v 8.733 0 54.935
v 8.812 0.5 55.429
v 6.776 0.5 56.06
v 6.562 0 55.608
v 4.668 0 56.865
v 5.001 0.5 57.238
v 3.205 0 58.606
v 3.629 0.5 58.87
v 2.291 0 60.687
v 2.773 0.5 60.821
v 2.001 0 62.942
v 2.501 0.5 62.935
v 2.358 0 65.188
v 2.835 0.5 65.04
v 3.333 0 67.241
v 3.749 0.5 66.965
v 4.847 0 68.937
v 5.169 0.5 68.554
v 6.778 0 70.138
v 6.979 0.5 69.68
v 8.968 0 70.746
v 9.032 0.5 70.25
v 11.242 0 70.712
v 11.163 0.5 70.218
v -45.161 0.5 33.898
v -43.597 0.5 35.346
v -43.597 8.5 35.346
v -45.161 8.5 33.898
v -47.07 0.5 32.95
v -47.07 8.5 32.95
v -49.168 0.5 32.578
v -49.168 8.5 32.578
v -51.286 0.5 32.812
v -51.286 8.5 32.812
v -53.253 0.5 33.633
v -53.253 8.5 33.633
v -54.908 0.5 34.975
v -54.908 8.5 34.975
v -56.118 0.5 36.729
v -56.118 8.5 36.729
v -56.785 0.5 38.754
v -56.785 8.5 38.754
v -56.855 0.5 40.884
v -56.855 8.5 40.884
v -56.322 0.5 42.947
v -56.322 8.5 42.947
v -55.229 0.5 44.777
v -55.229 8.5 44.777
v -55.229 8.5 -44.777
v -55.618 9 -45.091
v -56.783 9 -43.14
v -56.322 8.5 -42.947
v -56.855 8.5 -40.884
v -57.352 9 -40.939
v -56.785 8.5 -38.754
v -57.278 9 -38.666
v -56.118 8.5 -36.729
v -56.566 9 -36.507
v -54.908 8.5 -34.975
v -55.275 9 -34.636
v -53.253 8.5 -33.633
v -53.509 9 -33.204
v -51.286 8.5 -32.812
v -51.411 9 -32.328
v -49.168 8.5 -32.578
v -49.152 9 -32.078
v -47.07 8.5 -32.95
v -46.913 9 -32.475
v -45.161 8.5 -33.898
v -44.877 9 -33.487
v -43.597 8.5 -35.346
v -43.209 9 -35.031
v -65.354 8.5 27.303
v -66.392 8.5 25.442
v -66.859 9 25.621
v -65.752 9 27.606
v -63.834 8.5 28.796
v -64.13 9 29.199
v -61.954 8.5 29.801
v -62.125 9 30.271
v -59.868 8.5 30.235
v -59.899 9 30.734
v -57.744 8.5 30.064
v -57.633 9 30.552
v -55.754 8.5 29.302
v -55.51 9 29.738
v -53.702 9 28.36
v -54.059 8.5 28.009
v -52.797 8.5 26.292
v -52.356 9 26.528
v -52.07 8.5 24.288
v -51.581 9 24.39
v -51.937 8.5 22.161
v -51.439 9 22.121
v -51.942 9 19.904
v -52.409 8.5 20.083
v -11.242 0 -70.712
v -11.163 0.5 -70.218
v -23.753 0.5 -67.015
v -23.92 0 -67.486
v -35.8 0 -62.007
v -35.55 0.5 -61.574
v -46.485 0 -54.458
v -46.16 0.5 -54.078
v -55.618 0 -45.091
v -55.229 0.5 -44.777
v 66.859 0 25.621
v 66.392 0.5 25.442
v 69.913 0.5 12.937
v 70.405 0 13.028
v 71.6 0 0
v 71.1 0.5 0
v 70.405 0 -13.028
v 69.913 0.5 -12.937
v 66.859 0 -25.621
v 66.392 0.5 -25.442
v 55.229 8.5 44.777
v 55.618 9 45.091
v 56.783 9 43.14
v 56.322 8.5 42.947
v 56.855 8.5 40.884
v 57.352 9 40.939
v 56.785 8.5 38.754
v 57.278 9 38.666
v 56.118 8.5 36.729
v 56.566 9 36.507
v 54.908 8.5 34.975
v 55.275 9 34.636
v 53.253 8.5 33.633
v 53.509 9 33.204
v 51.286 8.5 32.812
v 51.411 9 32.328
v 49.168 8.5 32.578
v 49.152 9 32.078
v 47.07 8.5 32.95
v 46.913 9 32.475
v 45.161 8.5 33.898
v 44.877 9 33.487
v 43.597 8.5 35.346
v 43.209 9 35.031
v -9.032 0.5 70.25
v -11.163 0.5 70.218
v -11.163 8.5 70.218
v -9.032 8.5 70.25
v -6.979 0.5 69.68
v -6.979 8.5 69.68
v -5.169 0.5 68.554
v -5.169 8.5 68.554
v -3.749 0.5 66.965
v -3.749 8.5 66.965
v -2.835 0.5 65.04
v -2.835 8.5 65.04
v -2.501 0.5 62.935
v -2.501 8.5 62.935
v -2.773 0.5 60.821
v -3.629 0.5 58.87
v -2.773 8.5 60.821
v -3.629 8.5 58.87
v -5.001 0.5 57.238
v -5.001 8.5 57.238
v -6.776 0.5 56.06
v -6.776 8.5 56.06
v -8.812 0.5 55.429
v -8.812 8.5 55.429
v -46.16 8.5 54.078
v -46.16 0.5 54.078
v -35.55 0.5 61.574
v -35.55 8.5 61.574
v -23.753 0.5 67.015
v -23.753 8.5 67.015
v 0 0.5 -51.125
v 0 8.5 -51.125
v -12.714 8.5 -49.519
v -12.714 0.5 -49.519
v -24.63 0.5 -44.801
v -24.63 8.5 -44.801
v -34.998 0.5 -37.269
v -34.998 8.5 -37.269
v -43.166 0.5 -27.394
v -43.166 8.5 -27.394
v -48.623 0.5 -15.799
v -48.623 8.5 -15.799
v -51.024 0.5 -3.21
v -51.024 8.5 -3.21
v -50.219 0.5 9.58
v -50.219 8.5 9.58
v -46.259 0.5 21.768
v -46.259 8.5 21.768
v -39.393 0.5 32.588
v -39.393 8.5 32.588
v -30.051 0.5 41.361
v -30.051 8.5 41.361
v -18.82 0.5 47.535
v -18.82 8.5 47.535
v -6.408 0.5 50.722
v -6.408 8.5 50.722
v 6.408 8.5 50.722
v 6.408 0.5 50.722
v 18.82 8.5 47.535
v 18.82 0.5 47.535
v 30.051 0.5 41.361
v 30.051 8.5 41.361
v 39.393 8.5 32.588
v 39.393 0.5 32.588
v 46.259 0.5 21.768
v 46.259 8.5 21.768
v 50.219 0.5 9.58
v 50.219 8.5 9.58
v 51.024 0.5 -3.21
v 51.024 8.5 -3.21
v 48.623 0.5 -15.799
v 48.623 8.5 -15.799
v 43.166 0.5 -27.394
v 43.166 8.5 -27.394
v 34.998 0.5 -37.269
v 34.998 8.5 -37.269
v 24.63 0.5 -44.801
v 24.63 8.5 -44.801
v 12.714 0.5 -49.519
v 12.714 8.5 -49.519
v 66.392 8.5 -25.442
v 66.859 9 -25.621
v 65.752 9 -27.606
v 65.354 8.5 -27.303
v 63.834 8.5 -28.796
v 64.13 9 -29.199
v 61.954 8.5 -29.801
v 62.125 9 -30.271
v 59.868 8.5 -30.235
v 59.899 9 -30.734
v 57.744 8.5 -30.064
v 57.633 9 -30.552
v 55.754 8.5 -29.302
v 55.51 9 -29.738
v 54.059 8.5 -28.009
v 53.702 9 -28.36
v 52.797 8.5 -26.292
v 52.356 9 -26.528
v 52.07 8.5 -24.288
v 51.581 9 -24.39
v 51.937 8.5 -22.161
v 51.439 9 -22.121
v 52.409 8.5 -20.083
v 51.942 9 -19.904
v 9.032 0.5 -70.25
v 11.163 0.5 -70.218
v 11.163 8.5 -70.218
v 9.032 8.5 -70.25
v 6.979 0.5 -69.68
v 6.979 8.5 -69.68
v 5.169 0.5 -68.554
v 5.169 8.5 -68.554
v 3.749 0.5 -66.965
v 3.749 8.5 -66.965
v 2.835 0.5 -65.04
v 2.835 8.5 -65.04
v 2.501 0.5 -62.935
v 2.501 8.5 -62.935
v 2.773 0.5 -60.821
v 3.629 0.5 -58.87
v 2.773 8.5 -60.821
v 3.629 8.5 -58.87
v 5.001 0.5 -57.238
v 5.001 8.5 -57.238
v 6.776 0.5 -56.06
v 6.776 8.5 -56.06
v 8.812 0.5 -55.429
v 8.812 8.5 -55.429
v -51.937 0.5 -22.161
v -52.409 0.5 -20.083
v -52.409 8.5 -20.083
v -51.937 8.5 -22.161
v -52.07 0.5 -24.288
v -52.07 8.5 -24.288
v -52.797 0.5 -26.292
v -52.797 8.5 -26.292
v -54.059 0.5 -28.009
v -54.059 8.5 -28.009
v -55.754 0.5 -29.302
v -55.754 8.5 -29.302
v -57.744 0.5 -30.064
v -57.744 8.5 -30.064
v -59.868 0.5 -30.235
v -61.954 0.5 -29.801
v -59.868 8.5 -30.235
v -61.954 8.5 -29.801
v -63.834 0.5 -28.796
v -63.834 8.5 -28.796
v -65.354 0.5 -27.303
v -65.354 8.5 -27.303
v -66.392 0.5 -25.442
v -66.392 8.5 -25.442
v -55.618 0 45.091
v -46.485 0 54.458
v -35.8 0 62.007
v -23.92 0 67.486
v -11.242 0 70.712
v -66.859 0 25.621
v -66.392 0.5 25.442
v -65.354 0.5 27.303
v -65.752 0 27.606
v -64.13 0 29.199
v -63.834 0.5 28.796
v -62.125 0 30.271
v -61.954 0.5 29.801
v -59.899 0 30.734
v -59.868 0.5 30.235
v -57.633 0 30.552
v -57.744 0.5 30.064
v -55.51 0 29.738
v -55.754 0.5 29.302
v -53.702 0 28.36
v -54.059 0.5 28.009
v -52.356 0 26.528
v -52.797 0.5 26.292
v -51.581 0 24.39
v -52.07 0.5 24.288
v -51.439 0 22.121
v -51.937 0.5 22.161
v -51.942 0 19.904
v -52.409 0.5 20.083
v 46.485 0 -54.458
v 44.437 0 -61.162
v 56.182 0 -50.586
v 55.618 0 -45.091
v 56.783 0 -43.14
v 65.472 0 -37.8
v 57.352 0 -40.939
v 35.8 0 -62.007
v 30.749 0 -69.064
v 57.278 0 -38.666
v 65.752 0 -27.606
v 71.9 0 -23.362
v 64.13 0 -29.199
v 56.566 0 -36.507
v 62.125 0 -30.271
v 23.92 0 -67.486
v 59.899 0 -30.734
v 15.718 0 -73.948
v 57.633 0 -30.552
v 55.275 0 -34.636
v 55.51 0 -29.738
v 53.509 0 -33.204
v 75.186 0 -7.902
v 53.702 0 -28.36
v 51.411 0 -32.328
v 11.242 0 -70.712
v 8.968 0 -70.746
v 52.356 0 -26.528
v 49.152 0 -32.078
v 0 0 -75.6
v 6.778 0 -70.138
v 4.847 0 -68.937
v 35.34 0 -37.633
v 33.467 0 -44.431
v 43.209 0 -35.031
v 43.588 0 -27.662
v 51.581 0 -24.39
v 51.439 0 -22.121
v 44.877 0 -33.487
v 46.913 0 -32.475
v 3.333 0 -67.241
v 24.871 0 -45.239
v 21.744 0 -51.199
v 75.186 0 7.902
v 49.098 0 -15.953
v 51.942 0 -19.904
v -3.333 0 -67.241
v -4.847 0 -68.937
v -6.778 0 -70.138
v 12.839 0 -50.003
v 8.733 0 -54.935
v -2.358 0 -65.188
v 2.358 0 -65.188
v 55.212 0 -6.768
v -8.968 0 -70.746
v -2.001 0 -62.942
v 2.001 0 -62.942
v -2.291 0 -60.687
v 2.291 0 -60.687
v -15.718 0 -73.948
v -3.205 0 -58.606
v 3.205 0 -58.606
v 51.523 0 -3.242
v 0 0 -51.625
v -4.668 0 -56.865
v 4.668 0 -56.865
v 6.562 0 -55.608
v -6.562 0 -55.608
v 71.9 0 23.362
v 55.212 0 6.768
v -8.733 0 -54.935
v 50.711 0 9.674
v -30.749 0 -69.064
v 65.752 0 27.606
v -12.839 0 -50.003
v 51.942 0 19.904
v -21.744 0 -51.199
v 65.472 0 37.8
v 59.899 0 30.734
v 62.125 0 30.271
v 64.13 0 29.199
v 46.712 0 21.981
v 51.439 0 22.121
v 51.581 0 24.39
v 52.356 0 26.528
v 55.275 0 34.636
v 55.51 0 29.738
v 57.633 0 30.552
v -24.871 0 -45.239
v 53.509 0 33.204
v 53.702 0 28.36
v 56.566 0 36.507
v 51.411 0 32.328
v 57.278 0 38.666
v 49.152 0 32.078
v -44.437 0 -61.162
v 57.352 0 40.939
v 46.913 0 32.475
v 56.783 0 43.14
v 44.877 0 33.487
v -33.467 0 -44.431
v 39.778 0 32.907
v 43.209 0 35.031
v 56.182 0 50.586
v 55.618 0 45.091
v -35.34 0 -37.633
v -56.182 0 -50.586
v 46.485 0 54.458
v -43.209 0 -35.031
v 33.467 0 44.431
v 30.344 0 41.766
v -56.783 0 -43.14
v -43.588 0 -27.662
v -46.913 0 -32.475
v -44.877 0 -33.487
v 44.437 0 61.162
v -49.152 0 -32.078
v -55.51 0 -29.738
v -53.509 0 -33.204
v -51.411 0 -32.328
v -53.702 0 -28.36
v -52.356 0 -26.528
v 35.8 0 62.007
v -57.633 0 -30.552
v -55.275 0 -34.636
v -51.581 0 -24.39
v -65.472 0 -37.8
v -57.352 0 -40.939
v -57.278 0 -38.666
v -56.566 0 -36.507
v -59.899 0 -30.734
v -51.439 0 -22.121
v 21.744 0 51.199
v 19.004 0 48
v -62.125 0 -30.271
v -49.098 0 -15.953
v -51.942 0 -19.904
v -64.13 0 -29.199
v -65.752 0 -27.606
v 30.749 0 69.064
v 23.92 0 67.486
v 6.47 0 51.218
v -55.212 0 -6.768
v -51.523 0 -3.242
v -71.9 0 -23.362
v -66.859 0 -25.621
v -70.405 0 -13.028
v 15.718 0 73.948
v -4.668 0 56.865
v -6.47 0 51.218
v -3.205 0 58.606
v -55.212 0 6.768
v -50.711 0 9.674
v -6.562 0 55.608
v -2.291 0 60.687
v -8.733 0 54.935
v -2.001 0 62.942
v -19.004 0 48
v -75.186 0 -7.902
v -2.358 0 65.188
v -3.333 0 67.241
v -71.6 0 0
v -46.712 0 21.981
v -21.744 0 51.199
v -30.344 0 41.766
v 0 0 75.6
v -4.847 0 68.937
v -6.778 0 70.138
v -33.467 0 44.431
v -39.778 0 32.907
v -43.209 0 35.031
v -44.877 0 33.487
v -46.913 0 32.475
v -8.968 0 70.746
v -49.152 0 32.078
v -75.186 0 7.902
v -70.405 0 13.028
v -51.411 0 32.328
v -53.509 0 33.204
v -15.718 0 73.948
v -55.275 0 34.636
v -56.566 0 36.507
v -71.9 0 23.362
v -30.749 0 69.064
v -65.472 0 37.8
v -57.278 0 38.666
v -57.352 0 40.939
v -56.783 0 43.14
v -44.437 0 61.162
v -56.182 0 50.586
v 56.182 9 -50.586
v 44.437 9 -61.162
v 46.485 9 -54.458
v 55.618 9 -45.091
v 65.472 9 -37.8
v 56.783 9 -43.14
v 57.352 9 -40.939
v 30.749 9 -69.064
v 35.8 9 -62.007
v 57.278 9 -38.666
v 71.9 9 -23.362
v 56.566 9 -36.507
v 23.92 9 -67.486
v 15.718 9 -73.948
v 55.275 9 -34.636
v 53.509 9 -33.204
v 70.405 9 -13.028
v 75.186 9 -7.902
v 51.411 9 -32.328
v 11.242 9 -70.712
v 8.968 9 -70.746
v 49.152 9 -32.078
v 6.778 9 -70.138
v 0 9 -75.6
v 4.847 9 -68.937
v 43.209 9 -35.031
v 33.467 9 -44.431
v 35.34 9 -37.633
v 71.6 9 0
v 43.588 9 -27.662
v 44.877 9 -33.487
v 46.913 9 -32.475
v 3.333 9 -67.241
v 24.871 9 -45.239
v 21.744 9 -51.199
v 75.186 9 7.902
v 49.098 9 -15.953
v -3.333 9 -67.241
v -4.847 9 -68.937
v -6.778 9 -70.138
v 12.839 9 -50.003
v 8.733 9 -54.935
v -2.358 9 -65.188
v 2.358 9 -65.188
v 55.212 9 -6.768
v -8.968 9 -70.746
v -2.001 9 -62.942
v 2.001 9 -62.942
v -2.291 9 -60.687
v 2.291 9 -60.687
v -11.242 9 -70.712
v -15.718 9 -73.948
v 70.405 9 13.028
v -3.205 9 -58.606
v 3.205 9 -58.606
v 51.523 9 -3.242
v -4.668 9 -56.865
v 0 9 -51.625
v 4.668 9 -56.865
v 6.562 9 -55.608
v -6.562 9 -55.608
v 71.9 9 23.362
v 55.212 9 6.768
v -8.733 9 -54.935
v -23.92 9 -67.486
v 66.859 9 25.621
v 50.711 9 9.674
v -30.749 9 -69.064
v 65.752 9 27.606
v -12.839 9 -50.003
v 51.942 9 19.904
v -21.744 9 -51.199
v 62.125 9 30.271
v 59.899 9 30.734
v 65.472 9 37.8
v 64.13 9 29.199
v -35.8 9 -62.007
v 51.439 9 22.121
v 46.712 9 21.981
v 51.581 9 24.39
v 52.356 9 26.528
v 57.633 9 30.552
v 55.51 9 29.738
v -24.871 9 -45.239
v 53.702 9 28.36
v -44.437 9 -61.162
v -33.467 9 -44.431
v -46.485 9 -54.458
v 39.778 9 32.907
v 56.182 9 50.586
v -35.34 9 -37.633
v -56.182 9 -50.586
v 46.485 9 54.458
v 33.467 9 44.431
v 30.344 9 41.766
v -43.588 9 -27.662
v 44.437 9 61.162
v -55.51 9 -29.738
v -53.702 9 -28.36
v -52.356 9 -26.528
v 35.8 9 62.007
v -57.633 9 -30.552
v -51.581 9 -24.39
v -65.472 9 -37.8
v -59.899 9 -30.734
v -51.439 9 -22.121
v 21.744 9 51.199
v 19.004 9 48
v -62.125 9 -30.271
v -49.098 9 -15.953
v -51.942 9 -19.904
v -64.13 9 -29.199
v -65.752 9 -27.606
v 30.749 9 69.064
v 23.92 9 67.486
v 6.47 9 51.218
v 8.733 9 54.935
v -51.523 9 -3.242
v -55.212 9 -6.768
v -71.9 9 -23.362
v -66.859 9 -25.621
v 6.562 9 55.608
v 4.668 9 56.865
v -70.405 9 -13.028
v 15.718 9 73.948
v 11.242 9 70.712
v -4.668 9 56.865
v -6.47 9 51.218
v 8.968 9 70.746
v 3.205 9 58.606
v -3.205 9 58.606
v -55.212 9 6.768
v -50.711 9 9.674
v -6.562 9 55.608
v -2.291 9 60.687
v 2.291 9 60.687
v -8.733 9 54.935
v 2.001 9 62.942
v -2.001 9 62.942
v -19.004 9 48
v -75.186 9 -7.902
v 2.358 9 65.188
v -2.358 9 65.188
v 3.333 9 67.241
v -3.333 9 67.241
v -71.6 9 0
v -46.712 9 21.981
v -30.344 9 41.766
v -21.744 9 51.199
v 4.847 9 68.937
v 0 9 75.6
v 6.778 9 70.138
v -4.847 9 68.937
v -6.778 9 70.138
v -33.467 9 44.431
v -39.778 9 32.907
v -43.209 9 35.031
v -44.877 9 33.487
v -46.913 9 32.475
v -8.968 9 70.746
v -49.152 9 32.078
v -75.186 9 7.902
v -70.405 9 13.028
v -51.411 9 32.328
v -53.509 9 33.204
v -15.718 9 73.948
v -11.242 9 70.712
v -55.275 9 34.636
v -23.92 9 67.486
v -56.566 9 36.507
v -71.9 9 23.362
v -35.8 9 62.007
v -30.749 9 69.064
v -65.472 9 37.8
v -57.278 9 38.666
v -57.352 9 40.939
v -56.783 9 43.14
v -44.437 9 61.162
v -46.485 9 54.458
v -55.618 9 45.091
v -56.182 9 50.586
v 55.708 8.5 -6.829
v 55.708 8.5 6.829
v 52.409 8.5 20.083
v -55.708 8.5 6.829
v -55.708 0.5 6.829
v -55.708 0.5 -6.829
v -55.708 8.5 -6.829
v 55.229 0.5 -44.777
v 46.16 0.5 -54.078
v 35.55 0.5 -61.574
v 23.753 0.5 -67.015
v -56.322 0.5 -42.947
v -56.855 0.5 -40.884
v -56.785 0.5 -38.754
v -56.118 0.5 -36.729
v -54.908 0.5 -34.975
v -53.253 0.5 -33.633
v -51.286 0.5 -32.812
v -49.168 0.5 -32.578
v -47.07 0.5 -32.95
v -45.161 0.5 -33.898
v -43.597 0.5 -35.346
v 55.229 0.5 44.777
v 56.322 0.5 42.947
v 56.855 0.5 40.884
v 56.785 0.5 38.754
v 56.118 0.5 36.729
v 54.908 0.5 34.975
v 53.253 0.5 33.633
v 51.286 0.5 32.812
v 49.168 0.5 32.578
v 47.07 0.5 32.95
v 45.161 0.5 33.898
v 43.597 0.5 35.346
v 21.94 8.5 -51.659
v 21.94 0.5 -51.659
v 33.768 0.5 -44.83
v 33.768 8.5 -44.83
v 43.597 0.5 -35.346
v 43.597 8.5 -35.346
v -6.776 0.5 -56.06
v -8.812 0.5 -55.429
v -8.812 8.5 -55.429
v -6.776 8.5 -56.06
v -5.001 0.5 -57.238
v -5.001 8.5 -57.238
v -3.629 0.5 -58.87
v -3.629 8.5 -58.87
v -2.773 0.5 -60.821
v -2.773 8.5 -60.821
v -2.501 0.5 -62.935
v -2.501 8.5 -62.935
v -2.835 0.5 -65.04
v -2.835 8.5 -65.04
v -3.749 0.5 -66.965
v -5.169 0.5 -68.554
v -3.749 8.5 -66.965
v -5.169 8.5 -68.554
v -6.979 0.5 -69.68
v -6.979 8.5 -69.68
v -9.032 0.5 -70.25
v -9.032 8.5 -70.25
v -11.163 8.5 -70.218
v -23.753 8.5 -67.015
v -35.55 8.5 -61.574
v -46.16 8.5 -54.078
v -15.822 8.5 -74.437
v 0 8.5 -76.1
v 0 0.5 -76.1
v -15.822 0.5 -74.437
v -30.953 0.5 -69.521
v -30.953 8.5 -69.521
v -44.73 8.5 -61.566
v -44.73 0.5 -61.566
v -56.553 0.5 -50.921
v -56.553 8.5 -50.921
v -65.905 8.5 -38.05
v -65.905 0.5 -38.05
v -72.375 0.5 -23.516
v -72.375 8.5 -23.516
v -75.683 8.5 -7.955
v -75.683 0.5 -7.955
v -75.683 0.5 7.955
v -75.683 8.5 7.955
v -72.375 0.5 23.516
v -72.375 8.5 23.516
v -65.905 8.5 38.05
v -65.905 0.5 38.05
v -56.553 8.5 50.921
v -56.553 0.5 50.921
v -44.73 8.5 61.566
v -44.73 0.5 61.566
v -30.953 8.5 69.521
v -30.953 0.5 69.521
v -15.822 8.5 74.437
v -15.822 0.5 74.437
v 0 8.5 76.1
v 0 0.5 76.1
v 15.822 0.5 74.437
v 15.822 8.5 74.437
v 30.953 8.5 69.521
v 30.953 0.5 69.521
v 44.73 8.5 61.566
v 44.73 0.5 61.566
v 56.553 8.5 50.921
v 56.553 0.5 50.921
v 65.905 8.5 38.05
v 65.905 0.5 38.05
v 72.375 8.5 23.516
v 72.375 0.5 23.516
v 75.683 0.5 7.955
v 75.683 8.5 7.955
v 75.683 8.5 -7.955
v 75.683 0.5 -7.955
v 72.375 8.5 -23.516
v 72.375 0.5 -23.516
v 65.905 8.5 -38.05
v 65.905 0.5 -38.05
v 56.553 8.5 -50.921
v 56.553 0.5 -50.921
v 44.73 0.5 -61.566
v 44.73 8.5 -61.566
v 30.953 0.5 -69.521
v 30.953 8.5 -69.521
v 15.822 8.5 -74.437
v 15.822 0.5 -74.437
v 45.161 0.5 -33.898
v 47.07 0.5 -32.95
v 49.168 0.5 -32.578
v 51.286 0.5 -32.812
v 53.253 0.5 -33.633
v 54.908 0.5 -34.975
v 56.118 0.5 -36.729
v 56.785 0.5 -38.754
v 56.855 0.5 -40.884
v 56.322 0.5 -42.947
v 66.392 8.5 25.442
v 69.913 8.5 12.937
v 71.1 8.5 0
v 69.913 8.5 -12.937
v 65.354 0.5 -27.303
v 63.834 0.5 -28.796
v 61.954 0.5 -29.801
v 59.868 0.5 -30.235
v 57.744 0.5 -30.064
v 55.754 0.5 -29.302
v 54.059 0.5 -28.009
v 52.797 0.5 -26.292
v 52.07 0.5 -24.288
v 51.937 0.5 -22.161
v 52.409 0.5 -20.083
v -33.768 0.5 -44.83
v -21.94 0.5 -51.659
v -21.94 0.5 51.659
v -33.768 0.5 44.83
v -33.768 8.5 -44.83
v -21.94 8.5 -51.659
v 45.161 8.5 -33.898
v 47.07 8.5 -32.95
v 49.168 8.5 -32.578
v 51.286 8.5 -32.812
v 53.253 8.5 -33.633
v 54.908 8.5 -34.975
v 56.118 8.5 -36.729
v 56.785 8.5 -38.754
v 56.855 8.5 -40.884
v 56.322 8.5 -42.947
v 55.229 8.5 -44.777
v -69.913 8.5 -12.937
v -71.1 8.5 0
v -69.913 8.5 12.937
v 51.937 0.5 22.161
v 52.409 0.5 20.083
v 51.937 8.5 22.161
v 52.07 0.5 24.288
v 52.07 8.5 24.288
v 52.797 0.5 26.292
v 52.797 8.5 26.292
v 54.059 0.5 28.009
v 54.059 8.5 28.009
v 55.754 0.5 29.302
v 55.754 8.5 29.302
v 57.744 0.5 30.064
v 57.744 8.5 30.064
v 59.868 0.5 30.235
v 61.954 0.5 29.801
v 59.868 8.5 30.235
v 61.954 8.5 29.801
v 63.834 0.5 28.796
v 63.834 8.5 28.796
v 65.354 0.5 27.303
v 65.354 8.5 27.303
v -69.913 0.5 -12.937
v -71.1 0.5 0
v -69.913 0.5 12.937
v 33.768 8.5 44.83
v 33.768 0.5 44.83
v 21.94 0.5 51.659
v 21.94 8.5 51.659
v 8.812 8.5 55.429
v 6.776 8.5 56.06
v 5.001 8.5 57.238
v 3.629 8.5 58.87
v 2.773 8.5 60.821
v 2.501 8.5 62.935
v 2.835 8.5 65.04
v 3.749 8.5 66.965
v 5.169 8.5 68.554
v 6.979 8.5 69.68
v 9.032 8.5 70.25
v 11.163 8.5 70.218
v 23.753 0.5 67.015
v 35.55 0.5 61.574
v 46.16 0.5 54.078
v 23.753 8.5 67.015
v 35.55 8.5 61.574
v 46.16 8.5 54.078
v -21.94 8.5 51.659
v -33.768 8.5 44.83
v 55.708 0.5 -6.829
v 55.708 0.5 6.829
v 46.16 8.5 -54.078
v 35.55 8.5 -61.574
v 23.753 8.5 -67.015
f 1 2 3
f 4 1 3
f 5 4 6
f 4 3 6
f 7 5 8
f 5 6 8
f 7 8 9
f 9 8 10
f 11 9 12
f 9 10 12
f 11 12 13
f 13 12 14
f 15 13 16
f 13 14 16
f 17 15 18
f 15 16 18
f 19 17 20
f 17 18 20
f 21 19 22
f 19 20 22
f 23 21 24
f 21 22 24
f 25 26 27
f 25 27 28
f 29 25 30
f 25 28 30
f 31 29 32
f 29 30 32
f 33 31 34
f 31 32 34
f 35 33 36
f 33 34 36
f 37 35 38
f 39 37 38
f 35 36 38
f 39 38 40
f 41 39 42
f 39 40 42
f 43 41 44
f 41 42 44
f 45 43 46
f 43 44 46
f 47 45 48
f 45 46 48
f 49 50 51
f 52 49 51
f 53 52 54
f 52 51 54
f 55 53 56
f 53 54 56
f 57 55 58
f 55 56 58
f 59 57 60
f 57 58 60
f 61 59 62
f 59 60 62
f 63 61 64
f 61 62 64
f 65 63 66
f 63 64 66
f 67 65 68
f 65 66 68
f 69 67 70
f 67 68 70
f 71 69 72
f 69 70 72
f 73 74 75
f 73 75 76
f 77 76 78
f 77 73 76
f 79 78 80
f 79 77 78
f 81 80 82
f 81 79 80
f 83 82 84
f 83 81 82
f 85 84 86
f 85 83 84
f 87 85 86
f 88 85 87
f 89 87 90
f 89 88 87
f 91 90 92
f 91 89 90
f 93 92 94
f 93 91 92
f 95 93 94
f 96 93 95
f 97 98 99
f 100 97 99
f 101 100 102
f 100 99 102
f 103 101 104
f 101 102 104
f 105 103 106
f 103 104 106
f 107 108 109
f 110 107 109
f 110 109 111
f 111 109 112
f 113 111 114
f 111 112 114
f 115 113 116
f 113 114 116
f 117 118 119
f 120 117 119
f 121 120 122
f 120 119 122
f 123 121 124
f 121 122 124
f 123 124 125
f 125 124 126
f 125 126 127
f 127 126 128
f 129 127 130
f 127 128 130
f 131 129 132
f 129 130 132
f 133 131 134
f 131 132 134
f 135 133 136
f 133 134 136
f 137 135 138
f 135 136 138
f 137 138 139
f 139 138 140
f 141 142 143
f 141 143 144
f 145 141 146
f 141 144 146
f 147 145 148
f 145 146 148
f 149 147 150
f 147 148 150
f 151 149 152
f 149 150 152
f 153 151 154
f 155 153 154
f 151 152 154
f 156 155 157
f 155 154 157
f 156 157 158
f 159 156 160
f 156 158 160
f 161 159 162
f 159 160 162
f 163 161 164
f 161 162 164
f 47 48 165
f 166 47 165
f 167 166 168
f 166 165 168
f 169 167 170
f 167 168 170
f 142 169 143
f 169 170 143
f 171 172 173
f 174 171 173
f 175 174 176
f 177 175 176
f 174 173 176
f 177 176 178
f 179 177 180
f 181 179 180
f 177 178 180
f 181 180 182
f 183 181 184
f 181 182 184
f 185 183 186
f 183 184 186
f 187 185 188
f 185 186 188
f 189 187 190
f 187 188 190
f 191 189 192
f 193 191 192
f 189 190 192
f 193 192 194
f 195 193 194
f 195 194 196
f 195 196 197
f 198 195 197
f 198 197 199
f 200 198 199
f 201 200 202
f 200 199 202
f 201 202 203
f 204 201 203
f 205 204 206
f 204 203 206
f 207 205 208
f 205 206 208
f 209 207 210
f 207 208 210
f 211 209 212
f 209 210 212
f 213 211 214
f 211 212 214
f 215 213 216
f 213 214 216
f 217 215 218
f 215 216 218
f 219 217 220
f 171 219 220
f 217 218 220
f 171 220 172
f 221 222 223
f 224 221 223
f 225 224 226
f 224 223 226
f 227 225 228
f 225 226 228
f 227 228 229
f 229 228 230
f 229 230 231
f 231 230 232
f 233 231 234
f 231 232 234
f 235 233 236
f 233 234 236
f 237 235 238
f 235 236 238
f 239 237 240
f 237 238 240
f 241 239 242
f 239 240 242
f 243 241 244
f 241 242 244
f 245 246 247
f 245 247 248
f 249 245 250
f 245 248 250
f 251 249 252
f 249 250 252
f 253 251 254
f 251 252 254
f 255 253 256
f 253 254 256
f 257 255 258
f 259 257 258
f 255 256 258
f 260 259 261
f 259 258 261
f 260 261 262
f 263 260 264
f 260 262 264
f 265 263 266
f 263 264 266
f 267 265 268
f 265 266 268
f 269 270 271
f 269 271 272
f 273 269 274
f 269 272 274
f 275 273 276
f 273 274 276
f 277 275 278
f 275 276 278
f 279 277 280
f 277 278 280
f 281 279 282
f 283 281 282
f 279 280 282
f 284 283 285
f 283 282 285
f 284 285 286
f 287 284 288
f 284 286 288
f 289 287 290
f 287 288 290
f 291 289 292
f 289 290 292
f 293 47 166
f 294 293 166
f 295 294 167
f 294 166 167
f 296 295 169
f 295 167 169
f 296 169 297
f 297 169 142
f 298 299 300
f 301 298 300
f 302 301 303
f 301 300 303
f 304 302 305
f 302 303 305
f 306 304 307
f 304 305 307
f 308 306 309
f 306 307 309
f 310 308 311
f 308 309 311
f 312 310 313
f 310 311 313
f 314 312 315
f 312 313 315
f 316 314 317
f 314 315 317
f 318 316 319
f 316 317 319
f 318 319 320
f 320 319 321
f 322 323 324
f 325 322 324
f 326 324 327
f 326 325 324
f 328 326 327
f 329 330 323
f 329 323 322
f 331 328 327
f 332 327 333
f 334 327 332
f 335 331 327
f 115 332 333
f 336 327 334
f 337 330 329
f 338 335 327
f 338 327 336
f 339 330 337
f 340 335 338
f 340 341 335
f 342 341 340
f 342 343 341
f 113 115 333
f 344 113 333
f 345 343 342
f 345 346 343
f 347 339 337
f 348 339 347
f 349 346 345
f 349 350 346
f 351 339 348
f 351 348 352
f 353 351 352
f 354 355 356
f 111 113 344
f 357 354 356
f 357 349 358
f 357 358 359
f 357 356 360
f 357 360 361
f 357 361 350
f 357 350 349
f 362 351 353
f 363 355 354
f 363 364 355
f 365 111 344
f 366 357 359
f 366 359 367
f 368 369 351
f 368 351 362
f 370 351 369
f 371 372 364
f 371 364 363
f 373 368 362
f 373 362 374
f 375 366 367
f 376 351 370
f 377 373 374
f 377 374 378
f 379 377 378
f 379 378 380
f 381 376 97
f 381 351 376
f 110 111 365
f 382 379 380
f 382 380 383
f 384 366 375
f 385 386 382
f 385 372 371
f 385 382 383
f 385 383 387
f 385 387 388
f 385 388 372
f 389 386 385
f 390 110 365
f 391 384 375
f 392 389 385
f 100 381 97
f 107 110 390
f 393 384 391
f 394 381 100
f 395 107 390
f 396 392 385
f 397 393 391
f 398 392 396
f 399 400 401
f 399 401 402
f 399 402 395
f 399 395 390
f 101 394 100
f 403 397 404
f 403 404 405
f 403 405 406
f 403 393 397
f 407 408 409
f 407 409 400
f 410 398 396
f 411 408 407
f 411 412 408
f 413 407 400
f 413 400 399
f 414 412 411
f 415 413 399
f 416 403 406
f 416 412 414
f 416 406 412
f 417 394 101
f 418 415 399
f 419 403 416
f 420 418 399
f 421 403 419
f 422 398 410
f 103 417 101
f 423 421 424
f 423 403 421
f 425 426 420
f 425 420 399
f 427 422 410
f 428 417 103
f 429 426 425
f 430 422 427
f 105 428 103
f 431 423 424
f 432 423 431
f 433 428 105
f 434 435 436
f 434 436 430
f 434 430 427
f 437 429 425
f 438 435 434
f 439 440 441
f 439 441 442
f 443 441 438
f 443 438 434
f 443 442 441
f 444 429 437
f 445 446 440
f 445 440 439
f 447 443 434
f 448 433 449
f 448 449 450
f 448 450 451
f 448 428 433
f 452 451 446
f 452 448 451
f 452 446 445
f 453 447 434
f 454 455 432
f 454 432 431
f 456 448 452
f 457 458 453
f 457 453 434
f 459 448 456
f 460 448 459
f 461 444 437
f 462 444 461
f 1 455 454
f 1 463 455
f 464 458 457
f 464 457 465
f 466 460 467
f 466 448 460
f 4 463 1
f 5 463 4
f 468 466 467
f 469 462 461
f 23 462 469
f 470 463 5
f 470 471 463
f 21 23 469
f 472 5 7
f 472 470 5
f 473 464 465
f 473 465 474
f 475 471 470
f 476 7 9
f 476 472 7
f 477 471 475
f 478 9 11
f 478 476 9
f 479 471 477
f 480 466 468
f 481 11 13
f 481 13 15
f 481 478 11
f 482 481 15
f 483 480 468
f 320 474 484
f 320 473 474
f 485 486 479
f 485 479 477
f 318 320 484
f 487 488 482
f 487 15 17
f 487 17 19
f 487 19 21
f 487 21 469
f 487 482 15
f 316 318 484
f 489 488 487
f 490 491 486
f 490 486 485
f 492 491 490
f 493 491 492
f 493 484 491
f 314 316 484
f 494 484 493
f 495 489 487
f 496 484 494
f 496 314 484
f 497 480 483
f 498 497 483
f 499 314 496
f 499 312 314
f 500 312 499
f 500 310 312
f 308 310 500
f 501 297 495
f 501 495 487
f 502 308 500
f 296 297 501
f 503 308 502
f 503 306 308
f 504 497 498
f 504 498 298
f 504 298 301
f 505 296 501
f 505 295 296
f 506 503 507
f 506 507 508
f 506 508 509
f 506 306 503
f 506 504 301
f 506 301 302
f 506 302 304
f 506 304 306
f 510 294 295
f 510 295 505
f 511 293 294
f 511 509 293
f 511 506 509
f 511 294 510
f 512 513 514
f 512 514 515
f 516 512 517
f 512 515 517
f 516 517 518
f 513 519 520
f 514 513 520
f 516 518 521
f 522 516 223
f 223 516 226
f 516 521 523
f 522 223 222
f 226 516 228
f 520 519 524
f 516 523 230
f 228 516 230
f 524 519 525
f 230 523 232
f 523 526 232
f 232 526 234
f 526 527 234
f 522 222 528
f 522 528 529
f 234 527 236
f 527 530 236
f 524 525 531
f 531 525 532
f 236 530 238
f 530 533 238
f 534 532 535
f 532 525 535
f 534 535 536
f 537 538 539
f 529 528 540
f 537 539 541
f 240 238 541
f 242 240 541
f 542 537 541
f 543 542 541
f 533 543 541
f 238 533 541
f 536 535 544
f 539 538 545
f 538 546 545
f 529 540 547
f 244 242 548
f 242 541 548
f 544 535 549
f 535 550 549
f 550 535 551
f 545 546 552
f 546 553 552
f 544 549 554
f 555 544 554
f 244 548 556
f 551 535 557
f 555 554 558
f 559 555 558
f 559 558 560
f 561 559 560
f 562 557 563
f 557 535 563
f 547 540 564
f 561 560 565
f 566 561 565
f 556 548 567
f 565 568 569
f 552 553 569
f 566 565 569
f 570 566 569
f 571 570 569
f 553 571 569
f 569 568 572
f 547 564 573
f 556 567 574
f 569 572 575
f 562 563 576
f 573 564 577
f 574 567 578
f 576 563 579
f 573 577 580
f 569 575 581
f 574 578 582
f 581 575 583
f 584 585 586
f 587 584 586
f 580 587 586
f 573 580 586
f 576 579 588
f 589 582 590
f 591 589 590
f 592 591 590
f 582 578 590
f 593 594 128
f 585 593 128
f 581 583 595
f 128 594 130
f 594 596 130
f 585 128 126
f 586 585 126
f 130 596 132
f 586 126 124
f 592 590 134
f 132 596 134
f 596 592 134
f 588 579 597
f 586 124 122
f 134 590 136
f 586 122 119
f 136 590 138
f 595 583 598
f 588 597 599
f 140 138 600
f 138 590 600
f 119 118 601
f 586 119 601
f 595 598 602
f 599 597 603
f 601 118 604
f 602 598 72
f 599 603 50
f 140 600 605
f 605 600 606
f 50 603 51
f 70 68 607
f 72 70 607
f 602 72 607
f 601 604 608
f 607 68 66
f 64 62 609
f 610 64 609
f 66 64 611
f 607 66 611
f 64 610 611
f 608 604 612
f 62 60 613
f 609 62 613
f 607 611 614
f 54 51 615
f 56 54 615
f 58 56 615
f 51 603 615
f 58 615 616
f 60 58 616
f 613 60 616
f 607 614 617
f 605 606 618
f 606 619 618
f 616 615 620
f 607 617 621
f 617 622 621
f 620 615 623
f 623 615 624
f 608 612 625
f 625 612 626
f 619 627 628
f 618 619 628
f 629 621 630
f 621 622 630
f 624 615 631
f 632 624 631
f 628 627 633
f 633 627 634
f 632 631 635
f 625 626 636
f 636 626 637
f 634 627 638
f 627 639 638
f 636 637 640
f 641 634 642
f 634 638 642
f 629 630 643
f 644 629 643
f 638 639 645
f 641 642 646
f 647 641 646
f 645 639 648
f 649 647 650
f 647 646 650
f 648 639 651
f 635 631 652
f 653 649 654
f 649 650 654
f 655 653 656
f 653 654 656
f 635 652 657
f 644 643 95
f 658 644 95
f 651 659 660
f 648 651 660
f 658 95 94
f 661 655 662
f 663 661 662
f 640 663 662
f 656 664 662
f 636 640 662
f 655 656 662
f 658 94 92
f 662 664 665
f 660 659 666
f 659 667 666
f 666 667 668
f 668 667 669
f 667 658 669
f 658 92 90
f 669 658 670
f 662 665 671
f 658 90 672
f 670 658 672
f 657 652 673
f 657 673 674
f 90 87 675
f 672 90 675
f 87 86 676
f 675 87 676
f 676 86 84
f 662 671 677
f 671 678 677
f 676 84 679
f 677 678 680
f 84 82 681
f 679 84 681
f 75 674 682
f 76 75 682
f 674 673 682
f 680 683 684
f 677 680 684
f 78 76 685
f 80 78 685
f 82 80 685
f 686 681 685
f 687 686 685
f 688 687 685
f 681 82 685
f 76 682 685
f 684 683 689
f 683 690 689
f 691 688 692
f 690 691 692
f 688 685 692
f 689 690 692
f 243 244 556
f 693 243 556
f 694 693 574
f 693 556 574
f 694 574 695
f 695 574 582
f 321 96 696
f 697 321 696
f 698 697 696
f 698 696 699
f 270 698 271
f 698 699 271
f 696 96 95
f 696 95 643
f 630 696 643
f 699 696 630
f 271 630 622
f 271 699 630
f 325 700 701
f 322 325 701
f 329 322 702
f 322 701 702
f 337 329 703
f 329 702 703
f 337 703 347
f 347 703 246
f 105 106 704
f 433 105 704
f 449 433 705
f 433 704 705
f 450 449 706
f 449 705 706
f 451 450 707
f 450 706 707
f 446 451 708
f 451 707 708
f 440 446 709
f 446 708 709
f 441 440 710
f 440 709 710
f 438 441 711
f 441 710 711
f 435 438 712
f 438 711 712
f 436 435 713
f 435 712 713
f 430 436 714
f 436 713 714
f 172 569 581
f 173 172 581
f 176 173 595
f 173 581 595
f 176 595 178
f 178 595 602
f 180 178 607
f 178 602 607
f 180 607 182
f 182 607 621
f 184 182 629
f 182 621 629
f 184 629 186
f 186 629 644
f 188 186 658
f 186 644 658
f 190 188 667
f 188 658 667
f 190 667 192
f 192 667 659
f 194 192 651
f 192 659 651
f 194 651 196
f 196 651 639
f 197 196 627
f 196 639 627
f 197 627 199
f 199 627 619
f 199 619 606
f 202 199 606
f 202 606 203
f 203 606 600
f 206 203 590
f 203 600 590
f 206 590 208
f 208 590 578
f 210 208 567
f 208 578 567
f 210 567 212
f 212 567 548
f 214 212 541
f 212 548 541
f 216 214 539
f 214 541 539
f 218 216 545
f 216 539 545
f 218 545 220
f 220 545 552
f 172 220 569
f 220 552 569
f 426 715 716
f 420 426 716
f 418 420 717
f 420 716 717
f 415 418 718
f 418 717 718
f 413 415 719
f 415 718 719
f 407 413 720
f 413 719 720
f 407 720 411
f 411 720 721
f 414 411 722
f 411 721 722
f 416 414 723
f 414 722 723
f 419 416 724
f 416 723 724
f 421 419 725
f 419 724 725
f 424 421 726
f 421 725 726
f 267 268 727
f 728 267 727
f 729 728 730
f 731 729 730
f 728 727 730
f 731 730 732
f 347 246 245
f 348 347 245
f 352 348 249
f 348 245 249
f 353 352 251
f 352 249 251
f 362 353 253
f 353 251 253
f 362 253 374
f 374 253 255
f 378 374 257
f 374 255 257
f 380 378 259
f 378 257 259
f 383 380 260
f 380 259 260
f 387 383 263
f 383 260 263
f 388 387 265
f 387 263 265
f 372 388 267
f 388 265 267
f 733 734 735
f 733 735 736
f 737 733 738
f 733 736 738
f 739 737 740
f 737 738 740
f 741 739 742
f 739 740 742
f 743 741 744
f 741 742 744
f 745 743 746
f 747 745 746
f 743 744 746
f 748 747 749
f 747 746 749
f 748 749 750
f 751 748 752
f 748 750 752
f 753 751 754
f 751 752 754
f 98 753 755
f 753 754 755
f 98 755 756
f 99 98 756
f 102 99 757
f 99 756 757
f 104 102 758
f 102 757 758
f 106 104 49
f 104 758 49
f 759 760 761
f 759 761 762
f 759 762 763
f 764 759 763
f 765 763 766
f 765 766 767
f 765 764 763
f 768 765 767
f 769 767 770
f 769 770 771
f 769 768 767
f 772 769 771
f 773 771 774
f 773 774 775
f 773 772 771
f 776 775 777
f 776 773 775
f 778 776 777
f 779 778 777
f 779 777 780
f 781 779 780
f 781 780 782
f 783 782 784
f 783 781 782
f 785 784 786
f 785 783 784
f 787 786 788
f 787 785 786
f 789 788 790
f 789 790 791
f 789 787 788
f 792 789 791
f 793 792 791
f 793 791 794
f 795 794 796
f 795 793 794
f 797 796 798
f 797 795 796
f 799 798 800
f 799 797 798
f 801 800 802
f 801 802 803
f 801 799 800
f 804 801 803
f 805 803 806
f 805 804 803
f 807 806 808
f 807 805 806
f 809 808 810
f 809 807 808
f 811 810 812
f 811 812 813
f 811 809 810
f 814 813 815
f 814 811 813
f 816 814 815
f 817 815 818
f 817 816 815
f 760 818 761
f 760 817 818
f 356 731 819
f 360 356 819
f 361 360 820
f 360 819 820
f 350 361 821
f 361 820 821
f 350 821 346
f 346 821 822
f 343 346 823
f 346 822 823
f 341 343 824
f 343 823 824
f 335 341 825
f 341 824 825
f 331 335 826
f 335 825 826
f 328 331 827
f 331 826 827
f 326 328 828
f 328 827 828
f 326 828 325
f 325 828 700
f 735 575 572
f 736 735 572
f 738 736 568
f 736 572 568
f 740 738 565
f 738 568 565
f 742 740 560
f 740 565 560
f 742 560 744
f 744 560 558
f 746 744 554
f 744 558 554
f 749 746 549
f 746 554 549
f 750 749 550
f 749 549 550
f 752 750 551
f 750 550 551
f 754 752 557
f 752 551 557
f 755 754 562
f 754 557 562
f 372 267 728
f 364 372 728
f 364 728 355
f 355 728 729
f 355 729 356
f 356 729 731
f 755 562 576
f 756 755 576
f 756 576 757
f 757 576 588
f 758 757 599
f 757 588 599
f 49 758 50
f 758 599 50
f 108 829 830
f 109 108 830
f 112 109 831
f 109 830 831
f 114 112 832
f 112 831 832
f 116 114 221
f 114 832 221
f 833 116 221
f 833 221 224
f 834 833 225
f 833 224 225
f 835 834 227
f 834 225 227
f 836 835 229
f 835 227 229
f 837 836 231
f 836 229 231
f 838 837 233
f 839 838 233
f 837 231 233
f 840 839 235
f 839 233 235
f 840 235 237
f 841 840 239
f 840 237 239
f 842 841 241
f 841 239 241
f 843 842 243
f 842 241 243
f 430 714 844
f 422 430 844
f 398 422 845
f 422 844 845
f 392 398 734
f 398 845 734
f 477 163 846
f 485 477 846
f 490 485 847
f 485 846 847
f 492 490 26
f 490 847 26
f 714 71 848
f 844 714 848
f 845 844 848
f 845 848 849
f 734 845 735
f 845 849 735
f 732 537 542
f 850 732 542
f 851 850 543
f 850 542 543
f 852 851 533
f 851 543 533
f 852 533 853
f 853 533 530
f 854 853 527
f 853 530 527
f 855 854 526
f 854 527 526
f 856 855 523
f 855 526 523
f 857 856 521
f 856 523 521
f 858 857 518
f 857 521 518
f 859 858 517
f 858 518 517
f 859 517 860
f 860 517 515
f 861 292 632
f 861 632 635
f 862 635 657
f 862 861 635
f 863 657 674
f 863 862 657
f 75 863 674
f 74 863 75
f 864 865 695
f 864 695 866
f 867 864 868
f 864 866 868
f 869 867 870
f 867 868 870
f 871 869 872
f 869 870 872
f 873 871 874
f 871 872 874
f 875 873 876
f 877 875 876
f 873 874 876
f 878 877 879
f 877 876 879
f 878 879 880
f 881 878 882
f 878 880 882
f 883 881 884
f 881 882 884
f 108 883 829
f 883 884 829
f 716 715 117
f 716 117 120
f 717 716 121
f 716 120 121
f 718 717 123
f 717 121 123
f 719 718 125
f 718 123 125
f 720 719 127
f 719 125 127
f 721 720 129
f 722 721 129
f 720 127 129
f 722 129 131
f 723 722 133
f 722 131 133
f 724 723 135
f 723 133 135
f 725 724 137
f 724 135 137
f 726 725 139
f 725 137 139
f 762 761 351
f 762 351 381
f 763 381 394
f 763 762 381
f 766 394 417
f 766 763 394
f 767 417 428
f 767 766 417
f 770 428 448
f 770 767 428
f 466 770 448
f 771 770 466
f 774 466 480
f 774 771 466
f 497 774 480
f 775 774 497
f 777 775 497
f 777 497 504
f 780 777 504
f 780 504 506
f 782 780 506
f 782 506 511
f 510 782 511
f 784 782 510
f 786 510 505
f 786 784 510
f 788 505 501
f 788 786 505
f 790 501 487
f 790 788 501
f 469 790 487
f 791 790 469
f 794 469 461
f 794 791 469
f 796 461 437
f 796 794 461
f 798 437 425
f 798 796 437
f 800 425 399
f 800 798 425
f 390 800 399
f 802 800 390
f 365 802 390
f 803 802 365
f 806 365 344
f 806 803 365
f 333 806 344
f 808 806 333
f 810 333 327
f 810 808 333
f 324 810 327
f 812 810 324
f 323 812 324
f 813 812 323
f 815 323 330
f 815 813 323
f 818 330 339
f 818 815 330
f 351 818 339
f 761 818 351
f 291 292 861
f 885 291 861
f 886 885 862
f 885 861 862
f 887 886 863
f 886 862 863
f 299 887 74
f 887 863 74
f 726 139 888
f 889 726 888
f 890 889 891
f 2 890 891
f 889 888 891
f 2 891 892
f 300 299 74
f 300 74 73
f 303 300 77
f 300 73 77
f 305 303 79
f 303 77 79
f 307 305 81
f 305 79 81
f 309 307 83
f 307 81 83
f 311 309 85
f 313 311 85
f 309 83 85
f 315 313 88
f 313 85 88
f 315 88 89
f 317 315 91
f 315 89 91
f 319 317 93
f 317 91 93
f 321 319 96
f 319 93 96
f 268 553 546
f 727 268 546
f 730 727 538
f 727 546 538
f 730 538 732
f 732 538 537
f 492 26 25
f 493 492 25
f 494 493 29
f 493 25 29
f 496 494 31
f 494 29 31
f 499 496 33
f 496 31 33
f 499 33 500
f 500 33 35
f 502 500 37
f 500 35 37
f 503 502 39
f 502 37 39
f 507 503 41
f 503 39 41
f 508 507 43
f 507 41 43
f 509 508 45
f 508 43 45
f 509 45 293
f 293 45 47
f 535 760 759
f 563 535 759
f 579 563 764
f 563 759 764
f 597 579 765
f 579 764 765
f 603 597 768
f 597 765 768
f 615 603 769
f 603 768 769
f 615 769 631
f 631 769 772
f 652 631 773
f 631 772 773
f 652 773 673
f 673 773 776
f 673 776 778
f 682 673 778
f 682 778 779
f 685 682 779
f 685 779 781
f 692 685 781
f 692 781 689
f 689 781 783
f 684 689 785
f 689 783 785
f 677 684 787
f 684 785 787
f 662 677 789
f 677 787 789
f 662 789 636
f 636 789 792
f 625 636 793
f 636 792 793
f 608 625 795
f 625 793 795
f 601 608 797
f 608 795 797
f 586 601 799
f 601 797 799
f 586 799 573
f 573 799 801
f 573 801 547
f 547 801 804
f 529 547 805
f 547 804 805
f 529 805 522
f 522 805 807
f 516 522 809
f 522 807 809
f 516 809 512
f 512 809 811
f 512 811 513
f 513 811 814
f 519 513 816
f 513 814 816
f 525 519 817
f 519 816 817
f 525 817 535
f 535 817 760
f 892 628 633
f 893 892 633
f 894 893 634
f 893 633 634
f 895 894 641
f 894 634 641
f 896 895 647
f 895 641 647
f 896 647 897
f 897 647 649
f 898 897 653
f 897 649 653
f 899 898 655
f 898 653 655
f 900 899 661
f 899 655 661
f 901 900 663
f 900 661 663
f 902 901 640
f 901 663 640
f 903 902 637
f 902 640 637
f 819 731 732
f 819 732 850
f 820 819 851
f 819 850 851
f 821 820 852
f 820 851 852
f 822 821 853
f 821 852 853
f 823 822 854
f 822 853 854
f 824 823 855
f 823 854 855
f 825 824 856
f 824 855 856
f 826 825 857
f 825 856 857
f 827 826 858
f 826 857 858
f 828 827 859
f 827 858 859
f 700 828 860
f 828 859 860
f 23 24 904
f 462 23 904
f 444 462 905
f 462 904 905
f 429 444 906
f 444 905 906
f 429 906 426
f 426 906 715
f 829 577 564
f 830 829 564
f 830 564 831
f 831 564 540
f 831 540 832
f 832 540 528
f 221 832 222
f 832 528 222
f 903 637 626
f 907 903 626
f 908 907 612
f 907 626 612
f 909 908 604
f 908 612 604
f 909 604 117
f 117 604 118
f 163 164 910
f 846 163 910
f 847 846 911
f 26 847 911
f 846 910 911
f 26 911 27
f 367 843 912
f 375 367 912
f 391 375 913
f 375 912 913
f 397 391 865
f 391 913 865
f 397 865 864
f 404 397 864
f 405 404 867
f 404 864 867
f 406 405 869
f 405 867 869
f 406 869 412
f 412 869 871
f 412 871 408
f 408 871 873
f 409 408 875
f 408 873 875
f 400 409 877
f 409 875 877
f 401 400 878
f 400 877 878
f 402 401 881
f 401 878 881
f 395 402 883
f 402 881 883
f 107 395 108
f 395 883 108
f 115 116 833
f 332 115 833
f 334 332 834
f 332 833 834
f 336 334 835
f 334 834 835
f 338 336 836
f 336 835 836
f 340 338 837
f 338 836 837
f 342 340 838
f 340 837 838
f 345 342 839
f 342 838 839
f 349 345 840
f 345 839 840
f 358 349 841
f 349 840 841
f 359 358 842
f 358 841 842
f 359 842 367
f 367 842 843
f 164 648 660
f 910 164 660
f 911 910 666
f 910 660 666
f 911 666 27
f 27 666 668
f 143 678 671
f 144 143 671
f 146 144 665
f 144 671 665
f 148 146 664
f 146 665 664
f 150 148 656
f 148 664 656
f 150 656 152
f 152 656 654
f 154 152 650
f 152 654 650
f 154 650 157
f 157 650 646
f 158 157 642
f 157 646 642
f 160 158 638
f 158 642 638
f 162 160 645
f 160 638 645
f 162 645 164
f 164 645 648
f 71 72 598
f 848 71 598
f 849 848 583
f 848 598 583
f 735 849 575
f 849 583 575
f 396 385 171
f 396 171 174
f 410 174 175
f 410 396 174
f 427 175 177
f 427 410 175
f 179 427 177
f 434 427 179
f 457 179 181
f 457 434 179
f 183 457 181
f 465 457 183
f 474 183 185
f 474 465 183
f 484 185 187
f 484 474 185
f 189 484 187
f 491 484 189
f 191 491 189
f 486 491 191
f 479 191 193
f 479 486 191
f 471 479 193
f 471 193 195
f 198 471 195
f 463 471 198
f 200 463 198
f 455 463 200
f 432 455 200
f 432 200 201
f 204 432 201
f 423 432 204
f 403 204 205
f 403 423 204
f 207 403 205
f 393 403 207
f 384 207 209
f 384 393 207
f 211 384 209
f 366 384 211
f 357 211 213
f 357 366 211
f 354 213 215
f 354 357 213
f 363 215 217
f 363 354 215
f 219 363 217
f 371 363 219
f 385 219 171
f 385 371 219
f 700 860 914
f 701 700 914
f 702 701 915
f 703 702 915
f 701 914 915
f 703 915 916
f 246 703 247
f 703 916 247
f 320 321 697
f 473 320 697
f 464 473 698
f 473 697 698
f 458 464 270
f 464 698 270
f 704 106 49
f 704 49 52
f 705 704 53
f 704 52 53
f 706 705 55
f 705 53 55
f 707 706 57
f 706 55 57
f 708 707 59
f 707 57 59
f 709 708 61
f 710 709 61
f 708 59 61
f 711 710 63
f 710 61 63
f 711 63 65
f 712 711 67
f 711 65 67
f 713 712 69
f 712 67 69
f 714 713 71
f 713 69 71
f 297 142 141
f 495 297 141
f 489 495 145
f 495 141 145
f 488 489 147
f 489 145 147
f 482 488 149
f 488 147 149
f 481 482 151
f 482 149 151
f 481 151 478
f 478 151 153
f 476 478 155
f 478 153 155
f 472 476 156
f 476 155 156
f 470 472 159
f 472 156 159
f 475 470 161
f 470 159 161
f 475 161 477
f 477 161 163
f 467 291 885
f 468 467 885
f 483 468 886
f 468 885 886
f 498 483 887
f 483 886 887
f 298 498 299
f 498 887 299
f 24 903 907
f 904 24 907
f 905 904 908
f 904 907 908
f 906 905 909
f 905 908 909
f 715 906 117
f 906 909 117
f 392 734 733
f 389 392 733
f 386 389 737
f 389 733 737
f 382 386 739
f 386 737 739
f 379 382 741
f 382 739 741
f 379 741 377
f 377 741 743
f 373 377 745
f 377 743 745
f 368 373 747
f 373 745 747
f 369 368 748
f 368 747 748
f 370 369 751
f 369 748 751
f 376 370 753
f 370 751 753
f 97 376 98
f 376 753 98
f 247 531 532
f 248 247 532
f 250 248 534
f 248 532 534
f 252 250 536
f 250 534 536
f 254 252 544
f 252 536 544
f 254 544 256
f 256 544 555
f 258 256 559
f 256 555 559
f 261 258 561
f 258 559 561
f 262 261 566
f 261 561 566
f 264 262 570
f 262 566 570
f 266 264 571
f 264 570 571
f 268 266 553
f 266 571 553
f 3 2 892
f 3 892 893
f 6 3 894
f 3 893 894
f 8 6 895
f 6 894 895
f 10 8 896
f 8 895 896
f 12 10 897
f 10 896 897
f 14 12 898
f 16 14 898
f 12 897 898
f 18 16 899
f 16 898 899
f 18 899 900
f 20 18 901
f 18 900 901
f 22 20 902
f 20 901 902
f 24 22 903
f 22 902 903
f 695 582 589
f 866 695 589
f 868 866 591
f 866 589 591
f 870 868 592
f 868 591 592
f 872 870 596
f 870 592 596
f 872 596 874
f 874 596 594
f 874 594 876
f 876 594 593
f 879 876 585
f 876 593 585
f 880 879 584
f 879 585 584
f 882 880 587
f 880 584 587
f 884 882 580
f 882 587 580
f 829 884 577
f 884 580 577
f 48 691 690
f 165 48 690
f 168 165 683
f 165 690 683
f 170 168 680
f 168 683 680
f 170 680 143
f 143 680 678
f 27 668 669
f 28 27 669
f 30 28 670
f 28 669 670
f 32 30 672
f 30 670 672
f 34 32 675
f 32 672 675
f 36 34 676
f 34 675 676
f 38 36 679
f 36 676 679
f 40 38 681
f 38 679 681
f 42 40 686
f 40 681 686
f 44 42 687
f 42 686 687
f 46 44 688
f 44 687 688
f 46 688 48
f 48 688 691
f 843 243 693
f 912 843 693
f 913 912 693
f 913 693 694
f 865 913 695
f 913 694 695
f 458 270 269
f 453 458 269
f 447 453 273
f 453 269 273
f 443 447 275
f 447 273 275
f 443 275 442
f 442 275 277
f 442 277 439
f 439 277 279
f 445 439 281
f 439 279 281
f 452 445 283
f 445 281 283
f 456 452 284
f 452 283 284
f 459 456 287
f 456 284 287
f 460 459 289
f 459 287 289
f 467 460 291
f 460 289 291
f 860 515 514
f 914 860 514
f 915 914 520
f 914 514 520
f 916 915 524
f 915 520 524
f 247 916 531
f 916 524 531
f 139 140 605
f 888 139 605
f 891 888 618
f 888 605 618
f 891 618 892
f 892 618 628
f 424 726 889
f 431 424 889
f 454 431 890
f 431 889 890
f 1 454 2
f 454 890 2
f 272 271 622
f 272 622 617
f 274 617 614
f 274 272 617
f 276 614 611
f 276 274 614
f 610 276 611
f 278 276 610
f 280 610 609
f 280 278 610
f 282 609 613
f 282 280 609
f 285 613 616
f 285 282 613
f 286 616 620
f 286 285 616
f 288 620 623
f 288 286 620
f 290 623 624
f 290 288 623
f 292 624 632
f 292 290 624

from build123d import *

# Parameters (mm, degrees)
SKETCH1_W                    = 24.97495
SKETCH1_H                    = 9
CUT_EXTRUDE1_DEPTH           = 10
CHAMFER3_SIZE                = 0.5
CHAMFER4_SIZE                = 0.5
CIRPATTERN1_COUNT            = 6
CHAMFER4_OF_CIRPATTERN1_SIZE = 0.5


with BuildPart() as part:
    # Sketch1 → Revolve1 (revolve)
    with BuildSketch(Plane.XY, mode=Mode.PRIVATE) as revolve1_sk:
        with Locations((63.612525, 4.5)):
            Rectangle(SKETCH1_W, SKETCH1_H)
    revolve(revolve1_sk.sketch.rotate(Axis((0, 0, 0), (0, 1, 0)), 90), axis=Axis((0, 0, 0), (0, 1, 0)))

    # Sketch2 → Cut-Extrude1 (cut)
    with BuildSketch(Plane(origin=(0, 9, 0), x_dir=(1, 0, 0), z_dir=(0, 1, 0))):
        with BuildLine():
            ThreePointArc((-66.392272497, 25.441622447), (-71.1, 0), (-66.392272497, -25.441622447))
            ThreePointArc((-66.392272497, -25.441622447), (-56.721330267, -29.754097391), (-52.408855323, -20.083155161))
            ThreePointArc((-52.408855323, -20.083155161), (-56.12505, 0), (-52.408855323, 20.083155161))
            ThreePointArc((-52.408855323, 20.083155161), (-56.721330267, 29.754097391), (-66.392272497, 25.441622447))
        make_face()
    cut_extrude1 = extrude(amount=-CUT_EXTRUDE1_DEPTH, mode=Mode.SUBTRACT)

    # Chamfer3
    chamfer3_edges = [part.edges().sort_by_distance(p)[0] for p in [
        (0, 0, 76.1),
        (0, 9, 76.1),
        (0, 9, 51.12505),
        (0, 0, 51.12505),
    ]]
    chamfer(chamfer3_edges, length=CHAMFER3_SIZE)

    # Chamfer4
    chamfer4_edges = [part.edges().sort_by_distance(p)[0] for p in [
        (-71.1, 0, 0),
        (-56.721330267, 0, -29.754097391),
        (-56.721330267, 0, 29.754097391),
        (-56.12505, 0, 0),
        (-56.12505, 9, 0),
        (-71.1, 9, 0),
        (-56.721330267, 9, 29.754097391),
        (-56.721330267, 9, -29.754097391),
    ]]
    chamfer(chamfer4_edges, length=CHAMFER4_SIZE)

    # CirPattern1: Cut-Extrude1 ×6 about axis
    cirpattern1_axis = Axis((0, 0, 0), (0, 1, 0))
    for i in range(1, CIRPATTERN1_COUNT):
        add(cut_extrude1.rotate(cirpattern1_axis, i * 360 / CIRPATTERN1_COUNT), mode=Mode.SUBTRACT)

    # Chamfer4 of CirPattern1
    chamfer4_of_cirpattern1_edges = [part.edges().sort_by_distance(p)[0] for p in [
        (-35.55, 0, 61.574406209),
        (-54.12846934, 0, 34.245064252),
        (-2.592860926, 0, 63.999161643),
        (-28.062525, 0, 48.605719089),
        (-28.062525, 9, 48.605719089),
        (-35.55, 9, 61.574406209),
        (-2.592860926, 9, 63.999161643),
        (-54.12846934, 9, 34.245064252),
        (35.55, 0, 61.574406209),
        (2.592860926, 0, 63.999161643),
        (54.12846934, 0, 34.245064252),
        (28.062525, 0, 48.605719089),
        (28.062525, 9, 48.605719089),
        (35.55, 9, 61.574406209),
        (54.12846934, 9, 34.245064252),
        (2.592860926, 9, 63.999161643),
        (71.1, 0, 0),
        (56.721330267, 0, 29.754097391),
        (56.721330267, 0, -29.754097391),
        (56.12505, 0, 0),
        (56.12505, 9, 0),
        (71.1, 9, 0),
        (56.721330267, 9, -29.754097391),
        (56.721330267, 9, 29.754097391),
        (35.55, 0, -61.574406209),
        (54.12846934, 0, -34.245064252),
        (2.592860926, 0, -63.999161643),
        (28.062525, 0, -48.605719089),
        (28.062525, 9, -48.605719089),
        (35.55, 9, -61.574406209),
        (2.592860926, 9, -63.999161643),
        (54.12846934, 9, -34.245064252),
        (-35.55, 0, -61.574406209),
        (-2.592860926, 0, -63.999161643),
        (-54.12846934, 0, -34.245064252),
        (-28.062525, 0, -48.605719089),
        (-28.062525, 9, -48.605719089),
        (-35.55, 9, -61.574406209),
        (-54.12846934, 9, -34.245064252),
        (-2.592860926, 9, -63.999161643),
    ]]
    chamfer(chamfer4_of_cirpattern1_edges, length=CHAMFER4_OF_CIRPATTERN1_SIZE)


solid = part.part
